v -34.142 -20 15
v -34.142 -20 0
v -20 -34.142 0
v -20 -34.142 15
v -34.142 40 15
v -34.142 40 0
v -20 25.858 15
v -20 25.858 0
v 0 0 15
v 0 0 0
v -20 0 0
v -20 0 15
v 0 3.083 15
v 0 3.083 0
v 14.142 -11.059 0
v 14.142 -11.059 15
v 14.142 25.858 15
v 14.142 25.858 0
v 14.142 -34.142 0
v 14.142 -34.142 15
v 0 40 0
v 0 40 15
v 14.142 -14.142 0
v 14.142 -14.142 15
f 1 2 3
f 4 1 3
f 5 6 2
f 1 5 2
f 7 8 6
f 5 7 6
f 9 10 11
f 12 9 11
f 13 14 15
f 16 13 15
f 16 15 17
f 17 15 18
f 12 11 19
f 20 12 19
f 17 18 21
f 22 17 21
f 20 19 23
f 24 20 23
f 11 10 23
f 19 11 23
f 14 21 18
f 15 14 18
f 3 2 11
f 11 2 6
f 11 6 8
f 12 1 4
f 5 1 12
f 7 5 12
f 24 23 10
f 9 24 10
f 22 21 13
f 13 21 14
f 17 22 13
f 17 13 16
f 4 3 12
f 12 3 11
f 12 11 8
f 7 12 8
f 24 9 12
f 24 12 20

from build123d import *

# Parameters (mm, degrees)
F1_DEPTH = 15


with BuildPart() as f1:
    # F0 (on Top) → F1 (new body)
    with BuildSketch(Plane.XY):
        Polygon((-20, 25.857864), (-34.142136, 40), (-34.142136, -20), (-20, -34.142136), (-20, 0), align=None)
        Polygon((14.142136, 25.857864), (0, 40), (0, 3.083084), (14.142136, -11.059052), align=None)
        Polygon((0, 0), (-20, 0), (14.142136, -34.142136), (14.142136, -14.142136), align=None)
    extrude(amount=F1_DEPTH)


solid = f1.part
